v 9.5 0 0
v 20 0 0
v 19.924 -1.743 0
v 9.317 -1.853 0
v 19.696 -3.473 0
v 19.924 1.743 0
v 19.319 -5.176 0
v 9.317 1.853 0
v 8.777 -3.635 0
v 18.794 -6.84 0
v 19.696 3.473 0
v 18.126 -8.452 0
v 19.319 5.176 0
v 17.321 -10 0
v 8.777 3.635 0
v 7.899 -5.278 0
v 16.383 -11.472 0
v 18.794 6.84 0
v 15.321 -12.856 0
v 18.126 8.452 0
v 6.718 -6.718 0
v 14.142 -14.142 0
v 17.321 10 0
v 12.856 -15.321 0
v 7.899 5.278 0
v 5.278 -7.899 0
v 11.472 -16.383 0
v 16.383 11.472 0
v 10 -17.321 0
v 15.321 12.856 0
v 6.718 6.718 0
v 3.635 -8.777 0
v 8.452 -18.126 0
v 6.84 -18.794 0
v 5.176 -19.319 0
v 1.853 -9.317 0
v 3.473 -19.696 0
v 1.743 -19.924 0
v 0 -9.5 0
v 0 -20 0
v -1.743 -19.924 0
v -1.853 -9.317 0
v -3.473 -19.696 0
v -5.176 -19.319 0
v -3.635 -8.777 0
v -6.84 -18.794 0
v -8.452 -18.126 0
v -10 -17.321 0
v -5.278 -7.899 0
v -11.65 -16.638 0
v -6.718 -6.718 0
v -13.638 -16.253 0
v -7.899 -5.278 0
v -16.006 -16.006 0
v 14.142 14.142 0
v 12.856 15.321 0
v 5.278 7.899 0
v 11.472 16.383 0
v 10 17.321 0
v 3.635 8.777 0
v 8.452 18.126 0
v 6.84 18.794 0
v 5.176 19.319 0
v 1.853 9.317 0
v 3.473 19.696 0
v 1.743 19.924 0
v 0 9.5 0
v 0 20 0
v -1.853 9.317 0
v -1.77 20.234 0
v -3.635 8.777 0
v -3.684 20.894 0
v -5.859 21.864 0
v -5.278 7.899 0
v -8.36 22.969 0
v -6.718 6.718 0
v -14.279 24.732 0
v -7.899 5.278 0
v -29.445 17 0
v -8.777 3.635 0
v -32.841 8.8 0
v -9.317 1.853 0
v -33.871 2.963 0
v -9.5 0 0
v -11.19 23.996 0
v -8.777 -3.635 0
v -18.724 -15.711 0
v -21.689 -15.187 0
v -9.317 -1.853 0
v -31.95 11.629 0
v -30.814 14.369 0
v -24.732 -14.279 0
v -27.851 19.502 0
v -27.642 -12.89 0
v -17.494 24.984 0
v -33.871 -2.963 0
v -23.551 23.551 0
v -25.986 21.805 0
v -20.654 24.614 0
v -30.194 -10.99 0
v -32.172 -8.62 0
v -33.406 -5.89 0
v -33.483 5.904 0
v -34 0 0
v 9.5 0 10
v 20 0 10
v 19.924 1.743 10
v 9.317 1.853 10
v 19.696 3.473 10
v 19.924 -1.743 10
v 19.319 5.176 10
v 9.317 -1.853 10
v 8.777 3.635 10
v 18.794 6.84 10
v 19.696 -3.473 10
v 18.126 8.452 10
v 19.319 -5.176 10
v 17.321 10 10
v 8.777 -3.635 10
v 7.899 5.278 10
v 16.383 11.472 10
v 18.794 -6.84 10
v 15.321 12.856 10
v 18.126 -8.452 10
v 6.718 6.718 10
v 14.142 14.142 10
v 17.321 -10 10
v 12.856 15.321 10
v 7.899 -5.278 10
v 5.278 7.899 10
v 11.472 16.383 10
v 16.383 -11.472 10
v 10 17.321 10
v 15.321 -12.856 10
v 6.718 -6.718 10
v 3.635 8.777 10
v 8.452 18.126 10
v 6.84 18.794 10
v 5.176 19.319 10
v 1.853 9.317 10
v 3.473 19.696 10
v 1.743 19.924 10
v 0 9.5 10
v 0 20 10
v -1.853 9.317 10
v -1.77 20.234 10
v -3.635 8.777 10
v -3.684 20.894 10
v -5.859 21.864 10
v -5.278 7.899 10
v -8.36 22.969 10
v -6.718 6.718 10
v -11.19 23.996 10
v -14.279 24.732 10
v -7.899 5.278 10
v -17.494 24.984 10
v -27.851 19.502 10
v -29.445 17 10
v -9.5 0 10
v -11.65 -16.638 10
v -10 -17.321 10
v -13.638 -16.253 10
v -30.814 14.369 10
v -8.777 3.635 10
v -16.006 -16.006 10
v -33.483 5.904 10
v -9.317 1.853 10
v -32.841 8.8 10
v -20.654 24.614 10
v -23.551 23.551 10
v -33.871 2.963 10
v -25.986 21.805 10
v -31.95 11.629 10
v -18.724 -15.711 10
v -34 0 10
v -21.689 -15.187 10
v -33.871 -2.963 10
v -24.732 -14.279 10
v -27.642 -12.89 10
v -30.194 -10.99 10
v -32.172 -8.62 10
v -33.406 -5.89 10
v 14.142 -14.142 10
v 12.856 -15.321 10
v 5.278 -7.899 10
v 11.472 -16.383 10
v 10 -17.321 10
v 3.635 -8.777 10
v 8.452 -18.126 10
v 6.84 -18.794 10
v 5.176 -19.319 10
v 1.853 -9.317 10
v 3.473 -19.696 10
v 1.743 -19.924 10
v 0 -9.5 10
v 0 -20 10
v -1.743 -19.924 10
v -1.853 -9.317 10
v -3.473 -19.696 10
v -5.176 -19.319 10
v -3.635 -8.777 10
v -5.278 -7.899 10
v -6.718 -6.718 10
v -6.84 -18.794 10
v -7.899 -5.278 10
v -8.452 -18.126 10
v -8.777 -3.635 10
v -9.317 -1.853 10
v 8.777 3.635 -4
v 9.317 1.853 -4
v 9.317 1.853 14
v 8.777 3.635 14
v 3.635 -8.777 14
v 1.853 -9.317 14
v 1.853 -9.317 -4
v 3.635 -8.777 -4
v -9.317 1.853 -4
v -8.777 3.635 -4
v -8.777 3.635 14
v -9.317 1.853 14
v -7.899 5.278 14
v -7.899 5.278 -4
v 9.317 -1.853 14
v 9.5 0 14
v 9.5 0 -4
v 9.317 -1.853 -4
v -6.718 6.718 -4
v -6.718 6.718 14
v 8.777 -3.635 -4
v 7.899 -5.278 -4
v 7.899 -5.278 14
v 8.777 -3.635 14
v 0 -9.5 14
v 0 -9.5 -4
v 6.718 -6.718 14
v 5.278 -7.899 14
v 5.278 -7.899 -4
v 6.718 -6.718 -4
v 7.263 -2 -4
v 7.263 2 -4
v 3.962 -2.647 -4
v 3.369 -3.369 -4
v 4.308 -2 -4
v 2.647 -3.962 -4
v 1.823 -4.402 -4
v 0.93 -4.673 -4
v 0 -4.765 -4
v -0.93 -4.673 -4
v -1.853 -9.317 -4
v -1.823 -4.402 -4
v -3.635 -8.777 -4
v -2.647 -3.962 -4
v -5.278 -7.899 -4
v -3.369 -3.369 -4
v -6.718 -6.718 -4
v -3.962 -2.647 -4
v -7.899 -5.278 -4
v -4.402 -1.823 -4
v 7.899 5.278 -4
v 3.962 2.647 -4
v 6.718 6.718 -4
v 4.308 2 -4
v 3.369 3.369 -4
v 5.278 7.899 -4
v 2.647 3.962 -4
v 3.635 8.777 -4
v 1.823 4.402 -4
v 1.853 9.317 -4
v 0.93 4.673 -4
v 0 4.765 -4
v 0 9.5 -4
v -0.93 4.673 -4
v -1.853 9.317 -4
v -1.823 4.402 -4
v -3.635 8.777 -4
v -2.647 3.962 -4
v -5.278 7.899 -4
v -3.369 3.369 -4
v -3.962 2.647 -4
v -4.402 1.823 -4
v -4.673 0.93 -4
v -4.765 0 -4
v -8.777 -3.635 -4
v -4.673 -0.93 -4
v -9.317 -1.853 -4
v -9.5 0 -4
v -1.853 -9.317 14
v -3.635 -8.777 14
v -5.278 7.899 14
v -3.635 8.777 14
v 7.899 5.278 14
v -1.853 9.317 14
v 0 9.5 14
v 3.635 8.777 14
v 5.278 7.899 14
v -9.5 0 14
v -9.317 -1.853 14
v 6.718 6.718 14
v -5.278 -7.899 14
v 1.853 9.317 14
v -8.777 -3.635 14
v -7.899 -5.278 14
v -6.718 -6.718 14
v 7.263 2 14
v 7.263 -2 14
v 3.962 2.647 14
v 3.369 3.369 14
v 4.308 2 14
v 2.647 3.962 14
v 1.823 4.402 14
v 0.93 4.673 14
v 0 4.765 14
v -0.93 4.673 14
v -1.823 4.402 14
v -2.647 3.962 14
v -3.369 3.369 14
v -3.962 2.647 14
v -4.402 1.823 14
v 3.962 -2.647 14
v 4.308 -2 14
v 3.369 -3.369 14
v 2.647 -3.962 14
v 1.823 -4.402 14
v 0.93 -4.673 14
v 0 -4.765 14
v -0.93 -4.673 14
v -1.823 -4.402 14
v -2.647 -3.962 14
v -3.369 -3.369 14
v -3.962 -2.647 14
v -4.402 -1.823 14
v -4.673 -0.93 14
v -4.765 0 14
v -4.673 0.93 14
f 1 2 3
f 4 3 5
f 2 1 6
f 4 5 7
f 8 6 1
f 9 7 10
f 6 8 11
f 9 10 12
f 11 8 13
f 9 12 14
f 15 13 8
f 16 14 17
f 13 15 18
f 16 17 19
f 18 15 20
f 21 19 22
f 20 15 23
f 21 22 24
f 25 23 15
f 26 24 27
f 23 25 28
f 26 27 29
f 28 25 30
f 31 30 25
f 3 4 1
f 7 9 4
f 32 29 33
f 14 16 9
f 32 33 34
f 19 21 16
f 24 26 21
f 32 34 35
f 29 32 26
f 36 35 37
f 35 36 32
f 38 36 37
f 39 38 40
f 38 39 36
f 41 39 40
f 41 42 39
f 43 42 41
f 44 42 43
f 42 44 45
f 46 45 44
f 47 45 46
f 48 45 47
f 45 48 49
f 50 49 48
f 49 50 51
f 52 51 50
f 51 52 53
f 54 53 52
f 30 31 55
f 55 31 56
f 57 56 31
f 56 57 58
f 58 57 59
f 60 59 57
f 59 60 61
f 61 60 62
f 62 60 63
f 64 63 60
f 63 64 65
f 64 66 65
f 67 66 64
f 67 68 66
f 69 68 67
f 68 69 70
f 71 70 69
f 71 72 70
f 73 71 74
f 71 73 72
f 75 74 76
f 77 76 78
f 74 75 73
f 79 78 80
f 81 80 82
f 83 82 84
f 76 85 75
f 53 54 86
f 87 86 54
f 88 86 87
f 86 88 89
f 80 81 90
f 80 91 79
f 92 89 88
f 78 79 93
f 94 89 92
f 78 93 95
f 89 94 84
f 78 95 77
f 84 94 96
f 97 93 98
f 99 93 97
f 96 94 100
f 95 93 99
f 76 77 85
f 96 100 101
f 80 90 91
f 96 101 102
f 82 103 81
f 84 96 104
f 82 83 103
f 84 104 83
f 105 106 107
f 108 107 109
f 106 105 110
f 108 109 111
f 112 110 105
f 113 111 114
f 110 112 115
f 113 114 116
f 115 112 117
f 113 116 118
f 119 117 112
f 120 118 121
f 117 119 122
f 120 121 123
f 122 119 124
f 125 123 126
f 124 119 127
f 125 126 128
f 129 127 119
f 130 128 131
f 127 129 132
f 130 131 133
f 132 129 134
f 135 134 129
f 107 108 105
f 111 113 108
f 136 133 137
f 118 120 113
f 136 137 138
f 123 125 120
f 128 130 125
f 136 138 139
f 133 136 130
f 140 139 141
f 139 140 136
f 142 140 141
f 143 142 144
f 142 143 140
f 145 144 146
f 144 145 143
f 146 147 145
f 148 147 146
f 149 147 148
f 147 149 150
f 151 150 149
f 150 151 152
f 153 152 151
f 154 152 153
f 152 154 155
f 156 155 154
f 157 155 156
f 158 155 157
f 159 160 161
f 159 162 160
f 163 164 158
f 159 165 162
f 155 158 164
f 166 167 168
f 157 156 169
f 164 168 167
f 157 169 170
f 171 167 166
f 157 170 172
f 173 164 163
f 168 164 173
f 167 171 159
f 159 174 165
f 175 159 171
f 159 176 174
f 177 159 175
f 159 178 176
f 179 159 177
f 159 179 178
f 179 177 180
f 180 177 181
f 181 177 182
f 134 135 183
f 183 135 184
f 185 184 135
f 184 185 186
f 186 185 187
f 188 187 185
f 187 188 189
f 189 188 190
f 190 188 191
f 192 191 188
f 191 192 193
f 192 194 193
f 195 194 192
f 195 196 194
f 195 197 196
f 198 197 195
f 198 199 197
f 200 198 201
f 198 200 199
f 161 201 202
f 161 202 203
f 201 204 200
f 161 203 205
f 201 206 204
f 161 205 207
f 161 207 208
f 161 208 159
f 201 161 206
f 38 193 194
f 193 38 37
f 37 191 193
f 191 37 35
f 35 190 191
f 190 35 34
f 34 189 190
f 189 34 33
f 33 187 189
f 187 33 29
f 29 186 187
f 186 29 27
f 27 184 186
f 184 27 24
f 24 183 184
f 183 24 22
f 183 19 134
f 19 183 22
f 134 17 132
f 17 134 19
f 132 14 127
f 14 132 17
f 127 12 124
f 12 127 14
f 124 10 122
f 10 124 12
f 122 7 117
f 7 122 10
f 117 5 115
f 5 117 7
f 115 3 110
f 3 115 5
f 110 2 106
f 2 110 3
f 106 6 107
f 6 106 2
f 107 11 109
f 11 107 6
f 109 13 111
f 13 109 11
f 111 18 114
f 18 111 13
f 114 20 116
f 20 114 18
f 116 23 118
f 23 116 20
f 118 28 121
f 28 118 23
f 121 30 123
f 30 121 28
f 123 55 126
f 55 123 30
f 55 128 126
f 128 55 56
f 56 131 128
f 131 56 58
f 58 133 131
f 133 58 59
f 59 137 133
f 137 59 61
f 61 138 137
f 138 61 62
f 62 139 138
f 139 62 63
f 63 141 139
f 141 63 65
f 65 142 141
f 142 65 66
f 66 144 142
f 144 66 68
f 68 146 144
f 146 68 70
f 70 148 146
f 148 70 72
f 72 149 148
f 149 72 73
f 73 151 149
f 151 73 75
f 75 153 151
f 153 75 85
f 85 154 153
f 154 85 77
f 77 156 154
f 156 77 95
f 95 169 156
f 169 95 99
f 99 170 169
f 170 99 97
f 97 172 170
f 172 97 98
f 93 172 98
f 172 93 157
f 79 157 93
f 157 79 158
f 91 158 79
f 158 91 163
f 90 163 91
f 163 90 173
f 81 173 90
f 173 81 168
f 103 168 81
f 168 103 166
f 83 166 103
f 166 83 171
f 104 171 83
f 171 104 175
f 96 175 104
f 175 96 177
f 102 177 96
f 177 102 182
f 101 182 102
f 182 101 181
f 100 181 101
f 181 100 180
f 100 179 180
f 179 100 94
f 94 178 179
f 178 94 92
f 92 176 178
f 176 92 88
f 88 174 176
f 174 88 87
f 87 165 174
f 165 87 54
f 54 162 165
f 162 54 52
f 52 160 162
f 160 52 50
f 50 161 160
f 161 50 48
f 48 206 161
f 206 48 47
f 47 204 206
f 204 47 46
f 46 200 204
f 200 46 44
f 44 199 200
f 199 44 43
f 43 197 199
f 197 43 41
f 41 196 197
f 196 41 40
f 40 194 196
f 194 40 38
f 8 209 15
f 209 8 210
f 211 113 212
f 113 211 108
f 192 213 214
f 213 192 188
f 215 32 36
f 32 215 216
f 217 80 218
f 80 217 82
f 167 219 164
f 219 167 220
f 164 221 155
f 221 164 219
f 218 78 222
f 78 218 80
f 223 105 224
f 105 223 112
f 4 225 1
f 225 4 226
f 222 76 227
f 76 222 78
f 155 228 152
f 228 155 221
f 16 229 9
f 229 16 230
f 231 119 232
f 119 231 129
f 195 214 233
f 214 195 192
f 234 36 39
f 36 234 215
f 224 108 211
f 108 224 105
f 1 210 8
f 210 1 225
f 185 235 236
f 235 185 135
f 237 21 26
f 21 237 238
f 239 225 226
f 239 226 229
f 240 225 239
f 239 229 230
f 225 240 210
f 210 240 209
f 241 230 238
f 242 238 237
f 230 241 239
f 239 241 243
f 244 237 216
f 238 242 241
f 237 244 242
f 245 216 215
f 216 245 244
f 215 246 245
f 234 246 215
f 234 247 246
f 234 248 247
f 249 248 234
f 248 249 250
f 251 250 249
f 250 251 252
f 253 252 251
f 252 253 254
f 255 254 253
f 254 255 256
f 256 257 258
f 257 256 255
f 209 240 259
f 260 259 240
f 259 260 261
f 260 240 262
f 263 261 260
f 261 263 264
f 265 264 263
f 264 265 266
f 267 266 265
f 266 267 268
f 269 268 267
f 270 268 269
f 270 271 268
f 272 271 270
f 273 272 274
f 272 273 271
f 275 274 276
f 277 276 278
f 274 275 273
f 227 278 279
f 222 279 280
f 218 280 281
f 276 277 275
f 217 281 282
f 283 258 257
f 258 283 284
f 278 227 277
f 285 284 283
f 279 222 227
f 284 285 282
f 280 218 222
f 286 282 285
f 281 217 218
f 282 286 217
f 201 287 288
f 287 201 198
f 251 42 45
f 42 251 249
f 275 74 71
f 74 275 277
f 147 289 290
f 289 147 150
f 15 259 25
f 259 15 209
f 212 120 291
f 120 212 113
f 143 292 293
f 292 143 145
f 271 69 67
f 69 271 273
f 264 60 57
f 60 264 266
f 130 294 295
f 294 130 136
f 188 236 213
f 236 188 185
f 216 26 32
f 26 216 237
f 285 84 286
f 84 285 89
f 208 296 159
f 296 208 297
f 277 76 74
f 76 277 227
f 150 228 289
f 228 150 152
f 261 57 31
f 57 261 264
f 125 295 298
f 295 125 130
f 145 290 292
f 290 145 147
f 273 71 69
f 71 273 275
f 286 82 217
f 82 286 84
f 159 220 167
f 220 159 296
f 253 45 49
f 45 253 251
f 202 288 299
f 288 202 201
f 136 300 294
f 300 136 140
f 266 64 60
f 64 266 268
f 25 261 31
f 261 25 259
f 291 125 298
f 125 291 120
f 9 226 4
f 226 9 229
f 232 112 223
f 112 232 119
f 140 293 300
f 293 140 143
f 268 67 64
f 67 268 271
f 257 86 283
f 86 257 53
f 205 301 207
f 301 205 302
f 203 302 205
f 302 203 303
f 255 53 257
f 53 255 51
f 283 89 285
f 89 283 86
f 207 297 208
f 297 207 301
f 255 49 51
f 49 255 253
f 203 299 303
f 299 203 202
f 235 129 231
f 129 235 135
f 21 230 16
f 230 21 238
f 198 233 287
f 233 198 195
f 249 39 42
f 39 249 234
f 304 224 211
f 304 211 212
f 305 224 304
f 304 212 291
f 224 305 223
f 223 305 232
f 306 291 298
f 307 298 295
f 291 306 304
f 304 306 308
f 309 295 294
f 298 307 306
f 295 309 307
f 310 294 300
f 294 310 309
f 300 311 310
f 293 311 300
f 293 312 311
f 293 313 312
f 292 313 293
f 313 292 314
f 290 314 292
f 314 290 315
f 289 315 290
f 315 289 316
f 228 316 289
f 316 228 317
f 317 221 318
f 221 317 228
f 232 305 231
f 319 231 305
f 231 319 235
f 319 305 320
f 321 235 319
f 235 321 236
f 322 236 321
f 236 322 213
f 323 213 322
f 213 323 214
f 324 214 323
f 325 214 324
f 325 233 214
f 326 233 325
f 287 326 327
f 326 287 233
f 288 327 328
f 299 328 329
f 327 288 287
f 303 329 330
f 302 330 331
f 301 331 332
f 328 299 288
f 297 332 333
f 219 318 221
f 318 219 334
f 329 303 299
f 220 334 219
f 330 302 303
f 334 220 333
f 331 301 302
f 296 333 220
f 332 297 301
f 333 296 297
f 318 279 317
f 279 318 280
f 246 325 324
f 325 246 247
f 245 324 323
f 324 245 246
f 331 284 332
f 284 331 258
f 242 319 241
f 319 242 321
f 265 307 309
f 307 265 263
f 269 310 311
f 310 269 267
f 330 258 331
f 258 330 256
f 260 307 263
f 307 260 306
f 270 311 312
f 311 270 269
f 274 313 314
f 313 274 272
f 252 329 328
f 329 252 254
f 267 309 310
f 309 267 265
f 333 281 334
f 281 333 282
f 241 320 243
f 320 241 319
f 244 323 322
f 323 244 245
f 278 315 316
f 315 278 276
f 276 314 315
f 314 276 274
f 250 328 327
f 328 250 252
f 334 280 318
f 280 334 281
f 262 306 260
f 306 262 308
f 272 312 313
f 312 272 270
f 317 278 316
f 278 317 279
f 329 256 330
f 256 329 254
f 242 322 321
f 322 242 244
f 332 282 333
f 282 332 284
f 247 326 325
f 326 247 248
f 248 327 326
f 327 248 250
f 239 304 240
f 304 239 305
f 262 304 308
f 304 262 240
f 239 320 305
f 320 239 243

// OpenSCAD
$fn = 32;

// ----------------------------------------------------------------------
// Cam: base radius 20 mm with a 14 mm lift over 150 degrees
// ----------------------------------------------------------------------

// --- parameters (mm) ---
base_r = 20;              // base radius
lift = 14;                // lift height above the base radius
lift_span = 150;          // angular width of the lift
lift_start = 90;          // angle where the lift starts
cam_t = 10;               // cam plate thickness
hub_d = 19;               // hub diameter
hub_h = 18;               // hub height
bore_d = 9.53;            // bore
key_w = 4;                // keyway width
key_depth = 2;            // keyway depth

cam_profile = [[20, 0], [19.924, 1.743], [19.696, 3.473], [19.319, 5.176], [18.794, 6.84], [18.126, 8.452], [17.321, 10], [16.383, 11.472], [15.321, 12.856], [14.142, 14.142], [12.856, 15.321], [11.472, 16.383], [10, 17.321], [8.452, 18.126], [6.84, 18.794], [5.176, 19.319], [3.473, 19.696], [1.743, 19.924], [0, 20], [-1.77, 20.234], [-3.684, 20.894], [-5.859, 21.864], [-8.36, 22.969], [-11.19, 23.996], [-14.279, 24.732], [-17.494, 24.984], [-20.654, 24.614], [-23.551, 23.551], [-25.986, 21.805], [-27.851, 19.502], [-29.445, 17], [-30.814, 14.369], [-31.95, 11.629], [-32.841, 8.8], [-33.483, 5.904], [-33.871, 2.963], [-34, 0], [-33.871, -2.963], [-33.406, -5.89], [-32.172, -8.62], [-30.194, -10.99], [-27.642, -12.89], [-24.732, -14.279], [-21.689, -15.187], [-18.724, -15.711], [-16.006, -16.006], [-13.638, -16.253], [-11.65, -16.638], [-10, -17.321], [-8.452, -18.126], [-6.84, -18.794], [-5.176, -19.319], [-3.473, -19.696], [-1.743, -19.924], [0, -20], [1.743, -19.924], [3.473, -19.696], [5.176, -19.319], [6.84, -18.794], [8.452, -18.126], [10, -17.321], [11.472, -16.383], [12.856, -15.321], [14.142, -14.142], [15.321, -12.856], [16.383, -11.472], [17.321, -10], [18.126, -8.452], [18.794, -6.84], [19.319, -5.176], [19.696, -3.473], [19.924, -1.743]];

difference() {
  union() {
    linear_extrude(height = cam_t) polygon(cam_profile);
    /* hub, proud of the cam plate on both sides */
    translate([0, 0, -4]) cylinder(h = hub_h, d = hub_d);
  }
  /* bore through the hub, 2.5 mm clear on both faces */
  translate([0, 0, -6.5]) cylinder(h = hub_h + 5, d = bore_d);
  /* keyway, milled through the whole hub */
  translate([2.763, -2, -6.5]) cube([4.5, 4, 23]);
}
